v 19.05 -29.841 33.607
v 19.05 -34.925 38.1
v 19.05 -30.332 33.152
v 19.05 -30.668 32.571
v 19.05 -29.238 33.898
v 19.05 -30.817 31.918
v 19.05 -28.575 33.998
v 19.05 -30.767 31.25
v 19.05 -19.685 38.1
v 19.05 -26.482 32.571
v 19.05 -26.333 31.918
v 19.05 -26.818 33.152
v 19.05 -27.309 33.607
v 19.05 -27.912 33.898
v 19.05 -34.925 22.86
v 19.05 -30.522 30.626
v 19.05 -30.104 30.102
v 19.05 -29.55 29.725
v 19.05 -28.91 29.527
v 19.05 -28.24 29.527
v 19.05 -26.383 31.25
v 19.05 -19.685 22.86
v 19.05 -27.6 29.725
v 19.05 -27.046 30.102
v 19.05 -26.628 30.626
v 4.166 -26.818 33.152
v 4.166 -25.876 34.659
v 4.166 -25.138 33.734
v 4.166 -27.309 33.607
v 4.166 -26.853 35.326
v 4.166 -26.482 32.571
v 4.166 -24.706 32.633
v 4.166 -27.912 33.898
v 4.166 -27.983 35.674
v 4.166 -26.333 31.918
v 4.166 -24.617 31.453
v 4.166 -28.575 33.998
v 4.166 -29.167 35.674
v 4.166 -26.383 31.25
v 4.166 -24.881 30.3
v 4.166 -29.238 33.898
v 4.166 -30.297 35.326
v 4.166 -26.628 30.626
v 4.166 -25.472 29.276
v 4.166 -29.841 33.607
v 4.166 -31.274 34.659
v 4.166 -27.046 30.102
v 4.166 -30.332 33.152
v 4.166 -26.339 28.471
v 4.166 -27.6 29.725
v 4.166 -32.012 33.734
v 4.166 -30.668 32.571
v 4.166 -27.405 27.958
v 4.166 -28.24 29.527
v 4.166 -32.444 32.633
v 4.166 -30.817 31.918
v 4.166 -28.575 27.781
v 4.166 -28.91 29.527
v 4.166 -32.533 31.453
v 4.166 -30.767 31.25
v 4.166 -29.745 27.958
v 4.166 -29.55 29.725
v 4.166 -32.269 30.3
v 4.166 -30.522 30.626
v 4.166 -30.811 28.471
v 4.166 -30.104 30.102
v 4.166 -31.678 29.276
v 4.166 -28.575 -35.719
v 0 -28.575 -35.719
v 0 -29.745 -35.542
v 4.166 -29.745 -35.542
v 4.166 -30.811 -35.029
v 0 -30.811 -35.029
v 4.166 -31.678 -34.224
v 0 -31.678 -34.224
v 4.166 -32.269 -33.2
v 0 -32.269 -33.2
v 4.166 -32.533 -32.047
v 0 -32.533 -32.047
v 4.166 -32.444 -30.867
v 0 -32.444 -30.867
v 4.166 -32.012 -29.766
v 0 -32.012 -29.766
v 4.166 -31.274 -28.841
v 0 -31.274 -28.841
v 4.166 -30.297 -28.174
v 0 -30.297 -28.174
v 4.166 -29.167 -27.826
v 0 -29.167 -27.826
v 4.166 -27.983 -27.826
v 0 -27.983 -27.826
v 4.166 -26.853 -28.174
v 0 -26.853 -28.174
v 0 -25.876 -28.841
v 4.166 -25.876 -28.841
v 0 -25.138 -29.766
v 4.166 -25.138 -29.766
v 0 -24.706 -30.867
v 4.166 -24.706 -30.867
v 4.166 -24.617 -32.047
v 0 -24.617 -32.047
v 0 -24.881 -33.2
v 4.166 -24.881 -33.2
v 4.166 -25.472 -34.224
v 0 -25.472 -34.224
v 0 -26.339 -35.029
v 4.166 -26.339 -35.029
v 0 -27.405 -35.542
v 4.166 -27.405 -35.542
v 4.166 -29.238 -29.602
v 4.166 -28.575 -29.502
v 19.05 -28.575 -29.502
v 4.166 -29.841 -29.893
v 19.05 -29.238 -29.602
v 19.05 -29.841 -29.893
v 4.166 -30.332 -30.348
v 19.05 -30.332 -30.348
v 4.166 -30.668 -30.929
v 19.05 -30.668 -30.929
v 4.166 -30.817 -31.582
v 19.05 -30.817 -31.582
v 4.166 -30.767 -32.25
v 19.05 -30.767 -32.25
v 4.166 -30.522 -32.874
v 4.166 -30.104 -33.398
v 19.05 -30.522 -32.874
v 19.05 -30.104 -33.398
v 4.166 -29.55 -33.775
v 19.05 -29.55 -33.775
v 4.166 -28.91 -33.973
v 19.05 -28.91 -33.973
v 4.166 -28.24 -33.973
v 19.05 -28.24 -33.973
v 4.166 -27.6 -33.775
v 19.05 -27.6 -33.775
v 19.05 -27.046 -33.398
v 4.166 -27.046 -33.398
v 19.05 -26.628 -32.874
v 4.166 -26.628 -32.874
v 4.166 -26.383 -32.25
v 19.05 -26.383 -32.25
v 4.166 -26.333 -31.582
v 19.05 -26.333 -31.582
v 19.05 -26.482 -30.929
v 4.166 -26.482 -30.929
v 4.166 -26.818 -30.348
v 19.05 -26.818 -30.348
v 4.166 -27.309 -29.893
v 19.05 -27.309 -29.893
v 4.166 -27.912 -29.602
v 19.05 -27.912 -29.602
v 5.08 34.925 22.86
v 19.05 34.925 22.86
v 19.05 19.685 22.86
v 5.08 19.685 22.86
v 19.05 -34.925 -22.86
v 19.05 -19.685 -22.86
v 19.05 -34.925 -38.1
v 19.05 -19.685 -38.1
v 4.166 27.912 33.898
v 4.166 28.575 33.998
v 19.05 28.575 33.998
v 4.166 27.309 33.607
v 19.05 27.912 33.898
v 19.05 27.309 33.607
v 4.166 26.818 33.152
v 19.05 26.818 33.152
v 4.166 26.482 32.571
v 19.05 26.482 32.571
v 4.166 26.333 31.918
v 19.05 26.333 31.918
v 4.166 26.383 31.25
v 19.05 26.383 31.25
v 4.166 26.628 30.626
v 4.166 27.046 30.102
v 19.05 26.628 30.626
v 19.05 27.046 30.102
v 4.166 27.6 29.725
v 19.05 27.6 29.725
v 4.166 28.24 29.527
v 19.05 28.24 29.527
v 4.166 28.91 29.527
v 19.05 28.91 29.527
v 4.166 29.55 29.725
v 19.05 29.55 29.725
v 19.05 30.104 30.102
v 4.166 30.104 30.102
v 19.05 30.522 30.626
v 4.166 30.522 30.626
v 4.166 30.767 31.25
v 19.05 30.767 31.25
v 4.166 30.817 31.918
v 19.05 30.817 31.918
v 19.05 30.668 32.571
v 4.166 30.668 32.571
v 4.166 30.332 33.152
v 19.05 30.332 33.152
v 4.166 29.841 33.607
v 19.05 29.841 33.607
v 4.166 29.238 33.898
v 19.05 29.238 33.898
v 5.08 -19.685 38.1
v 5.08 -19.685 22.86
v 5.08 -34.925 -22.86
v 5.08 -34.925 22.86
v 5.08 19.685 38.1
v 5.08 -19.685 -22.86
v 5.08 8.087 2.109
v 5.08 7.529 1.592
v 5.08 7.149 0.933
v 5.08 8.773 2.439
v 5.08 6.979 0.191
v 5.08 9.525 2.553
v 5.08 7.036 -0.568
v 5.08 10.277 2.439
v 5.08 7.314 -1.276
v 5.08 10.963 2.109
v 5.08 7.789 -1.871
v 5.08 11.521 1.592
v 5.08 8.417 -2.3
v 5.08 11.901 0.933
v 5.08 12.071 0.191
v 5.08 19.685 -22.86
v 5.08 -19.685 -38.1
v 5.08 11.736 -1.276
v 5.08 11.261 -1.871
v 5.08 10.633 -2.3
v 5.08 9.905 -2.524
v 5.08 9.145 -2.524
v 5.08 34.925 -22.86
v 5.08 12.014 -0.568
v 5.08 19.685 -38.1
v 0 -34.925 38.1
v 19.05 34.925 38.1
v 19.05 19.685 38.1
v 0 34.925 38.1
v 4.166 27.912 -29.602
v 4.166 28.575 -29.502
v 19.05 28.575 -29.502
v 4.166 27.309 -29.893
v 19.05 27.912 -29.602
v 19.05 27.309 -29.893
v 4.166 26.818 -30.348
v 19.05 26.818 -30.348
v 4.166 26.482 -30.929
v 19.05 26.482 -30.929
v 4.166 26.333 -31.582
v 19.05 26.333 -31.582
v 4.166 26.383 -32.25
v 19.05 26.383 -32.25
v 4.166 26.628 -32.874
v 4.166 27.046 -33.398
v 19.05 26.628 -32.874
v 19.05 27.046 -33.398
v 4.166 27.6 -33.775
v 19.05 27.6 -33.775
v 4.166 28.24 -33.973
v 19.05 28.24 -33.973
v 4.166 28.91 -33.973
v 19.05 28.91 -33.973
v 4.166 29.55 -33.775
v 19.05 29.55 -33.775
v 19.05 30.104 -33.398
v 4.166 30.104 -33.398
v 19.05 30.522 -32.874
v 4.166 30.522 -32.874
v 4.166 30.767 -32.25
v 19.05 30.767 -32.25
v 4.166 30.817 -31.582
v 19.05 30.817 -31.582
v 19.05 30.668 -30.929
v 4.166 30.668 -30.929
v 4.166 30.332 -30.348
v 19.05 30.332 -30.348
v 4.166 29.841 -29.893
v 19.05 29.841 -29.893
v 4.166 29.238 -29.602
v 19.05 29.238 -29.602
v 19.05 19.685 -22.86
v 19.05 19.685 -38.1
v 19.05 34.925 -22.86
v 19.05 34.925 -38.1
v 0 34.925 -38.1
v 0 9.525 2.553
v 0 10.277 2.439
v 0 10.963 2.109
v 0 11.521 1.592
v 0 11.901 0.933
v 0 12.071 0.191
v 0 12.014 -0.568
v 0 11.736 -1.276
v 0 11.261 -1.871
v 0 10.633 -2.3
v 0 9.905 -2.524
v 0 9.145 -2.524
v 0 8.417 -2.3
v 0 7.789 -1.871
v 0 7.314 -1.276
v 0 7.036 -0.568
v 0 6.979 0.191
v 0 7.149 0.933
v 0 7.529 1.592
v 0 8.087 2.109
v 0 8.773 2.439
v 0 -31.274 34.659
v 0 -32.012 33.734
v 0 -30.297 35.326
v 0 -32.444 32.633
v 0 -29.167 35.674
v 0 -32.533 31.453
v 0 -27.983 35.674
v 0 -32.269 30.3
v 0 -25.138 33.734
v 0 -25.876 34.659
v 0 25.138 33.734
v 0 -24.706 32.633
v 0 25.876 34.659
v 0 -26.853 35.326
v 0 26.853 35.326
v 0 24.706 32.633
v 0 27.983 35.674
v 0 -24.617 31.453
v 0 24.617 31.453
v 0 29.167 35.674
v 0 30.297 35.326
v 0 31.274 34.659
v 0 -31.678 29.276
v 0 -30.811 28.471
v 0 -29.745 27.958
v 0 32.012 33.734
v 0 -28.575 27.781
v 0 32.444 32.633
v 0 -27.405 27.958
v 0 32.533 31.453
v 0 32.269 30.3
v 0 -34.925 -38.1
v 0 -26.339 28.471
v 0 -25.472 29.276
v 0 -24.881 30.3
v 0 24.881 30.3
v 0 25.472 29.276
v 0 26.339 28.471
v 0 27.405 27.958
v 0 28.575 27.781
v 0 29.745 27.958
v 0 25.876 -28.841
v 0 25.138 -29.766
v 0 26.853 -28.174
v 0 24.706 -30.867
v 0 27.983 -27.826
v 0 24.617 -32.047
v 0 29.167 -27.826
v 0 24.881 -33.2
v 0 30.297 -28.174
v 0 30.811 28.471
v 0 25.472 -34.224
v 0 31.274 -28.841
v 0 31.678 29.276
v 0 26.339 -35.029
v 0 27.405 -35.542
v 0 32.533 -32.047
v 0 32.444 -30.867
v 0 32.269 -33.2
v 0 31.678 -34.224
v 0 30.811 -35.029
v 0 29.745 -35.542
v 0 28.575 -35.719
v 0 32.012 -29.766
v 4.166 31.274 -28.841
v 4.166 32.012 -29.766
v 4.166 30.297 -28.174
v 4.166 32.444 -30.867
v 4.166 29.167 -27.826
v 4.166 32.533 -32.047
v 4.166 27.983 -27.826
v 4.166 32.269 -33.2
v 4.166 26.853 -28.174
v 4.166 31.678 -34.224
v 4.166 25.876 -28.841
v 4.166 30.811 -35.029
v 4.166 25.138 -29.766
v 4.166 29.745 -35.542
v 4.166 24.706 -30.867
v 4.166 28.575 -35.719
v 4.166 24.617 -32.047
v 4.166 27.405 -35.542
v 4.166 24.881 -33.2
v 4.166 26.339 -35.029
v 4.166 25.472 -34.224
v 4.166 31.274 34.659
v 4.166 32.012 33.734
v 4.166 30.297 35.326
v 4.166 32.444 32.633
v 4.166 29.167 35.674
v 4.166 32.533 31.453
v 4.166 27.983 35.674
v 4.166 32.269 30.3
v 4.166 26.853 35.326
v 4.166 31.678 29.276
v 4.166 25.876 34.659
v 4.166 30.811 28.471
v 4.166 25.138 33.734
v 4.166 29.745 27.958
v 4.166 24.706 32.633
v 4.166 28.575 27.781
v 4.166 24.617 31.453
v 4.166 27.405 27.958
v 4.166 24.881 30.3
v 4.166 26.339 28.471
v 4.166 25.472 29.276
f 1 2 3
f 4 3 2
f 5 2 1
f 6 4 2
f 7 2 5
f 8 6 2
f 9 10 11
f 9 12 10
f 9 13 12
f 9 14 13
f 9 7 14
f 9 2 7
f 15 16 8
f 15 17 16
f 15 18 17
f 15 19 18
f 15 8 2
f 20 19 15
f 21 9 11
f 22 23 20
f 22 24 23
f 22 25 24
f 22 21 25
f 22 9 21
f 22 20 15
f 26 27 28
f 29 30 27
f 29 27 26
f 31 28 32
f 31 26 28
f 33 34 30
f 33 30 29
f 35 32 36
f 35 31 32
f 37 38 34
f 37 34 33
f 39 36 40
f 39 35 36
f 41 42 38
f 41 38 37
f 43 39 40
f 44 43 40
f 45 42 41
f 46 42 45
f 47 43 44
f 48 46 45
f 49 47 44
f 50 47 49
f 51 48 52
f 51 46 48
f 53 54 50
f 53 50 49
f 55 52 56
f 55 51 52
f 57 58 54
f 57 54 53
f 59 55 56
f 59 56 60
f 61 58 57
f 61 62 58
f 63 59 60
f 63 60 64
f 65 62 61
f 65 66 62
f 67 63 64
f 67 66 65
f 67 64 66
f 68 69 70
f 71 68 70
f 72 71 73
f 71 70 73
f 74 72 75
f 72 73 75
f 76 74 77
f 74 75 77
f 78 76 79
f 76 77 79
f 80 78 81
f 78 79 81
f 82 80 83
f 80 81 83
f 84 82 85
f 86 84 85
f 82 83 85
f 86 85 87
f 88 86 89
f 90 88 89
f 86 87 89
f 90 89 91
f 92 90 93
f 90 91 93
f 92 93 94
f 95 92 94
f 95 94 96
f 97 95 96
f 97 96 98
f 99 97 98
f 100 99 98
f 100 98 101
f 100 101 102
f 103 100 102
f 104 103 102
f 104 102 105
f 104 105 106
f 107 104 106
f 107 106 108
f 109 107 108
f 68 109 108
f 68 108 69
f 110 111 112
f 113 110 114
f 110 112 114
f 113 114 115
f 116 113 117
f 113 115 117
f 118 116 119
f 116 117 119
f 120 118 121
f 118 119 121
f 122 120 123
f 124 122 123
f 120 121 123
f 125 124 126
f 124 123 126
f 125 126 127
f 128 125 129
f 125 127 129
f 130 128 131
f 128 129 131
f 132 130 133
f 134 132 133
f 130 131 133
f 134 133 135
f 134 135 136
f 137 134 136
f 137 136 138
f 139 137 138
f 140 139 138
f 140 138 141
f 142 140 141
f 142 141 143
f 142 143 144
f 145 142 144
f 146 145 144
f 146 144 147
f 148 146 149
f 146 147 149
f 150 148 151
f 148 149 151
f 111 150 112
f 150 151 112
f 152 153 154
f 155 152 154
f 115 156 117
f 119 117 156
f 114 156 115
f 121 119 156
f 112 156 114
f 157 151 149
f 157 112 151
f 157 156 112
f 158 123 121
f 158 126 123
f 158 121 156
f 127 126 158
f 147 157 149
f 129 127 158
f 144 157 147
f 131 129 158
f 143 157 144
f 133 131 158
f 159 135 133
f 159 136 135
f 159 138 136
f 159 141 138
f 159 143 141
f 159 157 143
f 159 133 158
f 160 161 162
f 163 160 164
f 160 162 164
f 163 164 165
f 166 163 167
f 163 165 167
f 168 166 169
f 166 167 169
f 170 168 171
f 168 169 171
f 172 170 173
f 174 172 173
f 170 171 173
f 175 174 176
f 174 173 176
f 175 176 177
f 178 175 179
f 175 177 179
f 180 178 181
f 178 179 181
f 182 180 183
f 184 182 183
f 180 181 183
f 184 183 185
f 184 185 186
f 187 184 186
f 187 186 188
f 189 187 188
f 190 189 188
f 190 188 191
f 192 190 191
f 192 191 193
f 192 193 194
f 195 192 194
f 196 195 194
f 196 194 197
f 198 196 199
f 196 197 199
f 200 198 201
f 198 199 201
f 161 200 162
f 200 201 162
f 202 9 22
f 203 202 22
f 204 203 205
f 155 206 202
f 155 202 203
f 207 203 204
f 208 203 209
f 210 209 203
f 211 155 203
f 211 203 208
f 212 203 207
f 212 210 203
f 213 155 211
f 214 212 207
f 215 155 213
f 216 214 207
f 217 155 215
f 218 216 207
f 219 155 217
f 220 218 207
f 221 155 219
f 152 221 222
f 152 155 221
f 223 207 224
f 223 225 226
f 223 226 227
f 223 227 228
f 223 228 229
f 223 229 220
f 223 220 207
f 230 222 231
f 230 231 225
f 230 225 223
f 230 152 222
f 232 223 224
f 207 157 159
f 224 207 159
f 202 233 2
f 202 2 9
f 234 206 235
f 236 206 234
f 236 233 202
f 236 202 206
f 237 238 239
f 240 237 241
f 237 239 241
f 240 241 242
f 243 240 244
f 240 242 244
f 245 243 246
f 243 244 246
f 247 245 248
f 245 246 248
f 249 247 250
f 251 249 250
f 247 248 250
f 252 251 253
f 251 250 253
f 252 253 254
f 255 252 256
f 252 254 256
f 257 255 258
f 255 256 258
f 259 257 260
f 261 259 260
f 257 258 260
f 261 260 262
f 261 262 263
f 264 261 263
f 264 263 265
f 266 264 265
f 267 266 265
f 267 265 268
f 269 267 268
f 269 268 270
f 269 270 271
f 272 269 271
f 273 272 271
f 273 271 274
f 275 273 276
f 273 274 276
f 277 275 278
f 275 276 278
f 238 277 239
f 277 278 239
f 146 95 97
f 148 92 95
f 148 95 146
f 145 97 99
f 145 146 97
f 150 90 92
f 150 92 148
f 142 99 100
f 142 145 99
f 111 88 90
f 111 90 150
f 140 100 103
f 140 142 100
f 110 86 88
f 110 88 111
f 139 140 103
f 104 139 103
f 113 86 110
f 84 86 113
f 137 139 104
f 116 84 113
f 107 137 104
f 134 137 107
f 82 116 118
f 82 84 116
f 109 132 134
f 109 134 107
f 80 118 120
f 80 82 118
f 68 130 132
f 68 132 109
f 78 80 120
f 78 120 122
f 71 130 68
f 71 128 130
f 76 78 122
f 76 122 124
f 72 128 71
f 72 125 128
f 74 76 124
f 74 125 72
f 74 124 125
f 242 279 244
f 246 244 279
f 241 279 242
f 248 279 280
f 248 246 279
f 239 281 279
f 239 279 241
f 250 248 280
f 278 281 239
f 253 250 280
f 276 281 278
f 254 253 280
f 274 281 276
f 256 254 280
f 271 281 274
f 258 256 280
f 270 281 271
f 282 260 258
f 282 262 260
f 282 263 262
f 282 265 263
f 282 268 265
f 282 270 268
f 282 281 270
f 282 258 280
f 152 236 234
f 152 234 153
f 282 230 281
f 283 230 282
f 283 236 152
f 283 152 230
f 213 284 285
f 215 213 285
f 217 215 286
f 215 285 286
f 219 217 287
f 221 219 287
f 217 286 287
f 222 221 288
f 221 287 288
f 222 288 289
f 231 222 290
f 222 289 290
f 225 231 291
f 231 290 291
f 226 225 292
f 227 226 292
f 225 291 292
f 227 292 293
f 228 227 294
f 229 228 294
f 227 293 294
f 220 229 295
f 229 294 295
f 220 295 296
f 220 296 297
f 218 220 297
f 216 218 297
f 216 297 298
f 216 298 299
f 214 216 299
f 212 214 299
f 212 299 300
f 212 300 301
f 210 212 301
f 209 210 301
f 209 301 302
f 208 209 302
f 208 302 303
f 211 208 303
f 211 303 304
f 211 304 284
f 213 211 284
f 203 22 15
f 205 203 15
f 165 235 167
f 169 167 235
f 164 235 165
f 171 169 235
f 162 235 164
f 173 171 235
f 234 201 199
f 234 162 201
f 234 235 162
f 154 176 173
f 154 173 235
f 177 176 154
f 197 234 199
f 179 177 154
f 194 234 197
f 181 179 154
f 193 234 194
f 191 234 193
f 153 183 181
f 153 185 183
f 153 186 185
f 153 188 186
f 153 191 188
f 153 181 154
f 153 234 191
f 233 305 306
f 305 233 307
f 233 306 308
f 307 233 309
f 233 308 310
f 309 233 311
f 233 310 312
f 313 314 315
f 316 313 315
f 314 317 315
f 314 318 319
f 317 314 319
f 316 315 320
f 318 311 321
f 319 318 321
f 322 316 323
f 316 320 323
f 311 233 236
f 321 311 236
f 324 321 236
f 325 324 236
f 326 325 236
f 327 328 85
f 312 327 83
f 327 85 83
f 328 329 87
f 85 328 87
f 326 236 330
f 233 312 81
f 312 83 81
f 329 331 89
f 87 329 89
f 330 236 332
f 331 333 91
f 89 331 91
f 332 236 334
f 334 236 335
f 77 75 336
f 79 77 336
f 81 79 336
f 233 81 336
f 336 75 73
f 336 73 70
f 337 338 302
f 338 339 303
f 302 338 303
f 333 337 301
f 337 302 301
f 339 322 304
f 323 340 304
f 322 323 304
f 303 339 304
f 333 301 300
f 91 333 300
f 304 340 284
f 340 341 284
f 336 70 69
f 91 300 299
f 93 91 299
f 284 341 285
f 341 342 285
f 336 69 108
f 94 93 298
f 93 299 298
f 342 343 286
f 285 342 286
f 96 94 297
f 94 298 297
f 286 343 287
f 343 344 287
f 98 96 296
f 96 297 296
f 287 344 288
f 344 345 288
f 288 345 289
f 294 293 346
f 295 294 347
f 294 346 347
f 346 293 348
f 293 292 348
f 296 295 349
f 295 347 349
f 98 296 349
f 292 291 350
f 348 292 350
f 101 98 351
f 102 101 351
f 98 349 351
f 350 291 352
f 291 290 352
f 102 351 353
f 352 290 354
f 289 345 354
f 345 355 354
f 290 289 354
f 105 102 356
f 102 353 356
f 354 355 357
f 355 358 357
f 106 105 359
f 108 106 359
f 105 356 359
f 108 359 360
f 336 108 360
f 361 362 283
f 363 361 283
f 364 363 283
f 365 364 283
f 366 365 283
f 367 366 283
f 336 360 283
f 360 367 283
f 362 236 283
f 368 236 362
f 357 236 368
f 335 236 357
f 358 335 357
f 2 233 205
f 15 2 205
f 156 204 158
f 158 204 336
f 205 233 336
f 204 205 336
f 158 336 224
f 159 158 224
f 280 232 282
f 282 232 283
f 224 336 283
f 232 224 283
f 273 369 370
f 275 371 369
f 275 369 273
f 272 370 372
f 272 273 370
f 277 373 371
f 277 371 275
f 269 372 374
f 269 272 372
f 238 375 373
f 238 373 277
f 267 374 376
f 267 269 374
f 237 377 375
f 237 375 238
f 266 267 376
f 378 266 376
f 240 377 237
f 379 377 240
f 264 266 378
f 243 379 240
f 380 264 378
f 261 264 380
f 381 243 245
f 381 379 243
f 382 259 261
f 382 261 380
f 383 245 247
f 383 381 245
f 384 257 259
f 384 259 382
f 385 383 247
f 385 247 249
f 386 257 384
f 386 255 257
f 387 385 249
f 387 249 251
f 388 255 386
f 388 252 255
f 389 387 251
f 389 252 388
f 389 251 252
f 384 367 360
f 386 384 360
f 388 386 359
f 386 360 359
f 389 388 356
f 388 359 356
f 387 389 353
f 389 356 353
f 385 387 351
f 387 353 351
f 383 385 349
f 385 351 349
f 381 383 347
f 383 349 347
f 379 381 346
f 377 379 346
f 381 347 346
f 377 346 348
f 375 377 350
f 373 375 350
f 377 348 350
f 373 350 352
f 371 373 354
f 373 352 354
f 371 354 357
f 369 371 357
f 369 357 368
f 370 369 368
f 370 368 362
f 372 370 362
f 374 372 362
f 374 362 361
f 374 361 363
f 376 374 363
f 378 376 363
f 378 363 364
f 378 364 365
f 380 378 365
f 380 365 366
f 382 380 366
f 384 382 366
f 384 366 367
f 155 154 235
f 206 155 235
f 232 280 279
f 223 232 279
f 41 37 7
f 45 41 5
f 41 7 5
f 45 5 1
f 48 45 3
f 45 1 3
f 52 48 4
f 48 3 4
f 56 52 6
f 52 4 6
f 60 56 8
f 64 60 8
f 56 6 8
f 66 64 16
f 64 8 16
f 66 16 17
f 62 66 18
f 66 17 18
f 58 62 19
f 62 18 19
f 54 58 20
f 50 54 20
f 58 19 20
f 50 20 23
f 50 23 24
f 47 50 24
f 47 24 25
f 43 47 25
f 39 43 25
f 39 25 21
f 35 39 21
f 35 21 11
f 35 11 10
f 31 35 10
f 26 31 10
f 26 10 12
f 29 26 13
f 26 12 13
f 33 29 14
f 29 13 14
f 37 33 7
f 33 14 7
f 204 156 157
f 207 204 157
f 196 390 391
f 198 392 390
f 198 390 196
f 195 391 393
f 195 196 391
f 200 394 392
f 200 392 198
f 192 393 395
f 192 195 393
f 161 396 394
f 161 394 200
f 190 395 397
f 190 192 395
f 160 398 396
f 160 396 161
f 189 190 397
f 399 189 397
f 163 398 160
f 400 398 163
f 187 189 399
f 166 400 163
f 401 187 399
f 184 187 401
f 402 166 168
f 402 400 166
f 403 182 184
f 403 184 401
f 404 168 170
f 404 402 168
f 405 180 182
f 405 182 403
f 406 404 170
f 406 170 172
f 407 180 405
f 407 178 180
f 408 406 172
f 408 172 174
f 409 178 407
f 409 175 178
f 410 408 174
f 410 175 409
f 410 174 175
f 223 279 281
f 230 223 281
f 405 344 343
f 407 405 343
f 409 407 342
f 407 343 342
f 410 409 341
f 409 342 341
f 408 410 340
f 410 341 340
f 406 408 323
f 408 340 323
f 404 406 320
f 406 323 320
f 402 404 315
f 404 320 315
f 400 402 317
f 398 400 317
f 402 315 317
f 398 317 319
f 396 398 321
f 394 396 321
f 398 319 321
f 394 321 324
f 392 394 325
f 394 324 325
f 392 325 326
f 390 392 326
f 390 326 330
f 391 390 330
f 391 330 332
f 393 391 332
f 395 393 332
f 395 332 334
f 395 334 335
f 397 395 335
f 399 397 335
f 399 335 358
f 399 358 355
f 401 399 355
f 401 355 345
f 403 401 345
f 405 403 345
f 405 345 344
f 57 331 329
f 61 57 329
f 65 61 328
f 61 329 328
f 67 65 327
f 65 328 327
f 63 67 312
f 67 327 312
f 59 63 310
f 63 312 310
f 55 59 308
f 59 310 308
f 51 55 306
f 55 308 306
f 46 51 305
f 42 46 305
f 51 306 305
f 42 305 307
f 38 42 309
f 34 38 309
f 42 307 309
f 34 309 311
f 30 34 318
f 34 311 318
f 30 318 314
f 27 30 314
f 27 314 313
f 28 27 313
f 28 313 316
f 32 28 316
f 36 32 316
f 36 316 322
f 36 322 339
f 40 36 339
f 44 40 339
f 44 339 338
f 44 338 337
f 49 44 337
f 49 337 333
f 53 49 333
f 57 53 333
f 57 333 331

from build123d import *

# Parameters (mm, degrees)
SKETCH1_W                                      = 76.2
SKETCH1_H                                      = 69.85
BOSS_EXTRUDE1_DEPTH                            = 19.05
CUT_EXTRUDE1_DEPTH                             = 13.97
CBORE_FOR_8_SOCKET_HEAD_CAP_SCREW1_D           = 4.4958
CBORE_FOR_8_SOCKET_HEAD_CAP_SCREW1_CBORE_D     = 7.9375
CBORE_FOR_8_SOCKET_HEAD_CAP_SCREW1_CBORE_DEPTH = 4.1656
F_1_4_20_TAPPED_HOLE1_D                        = 5.1054
F_1_4_20_TAPPED_HOLE1_DEPTH                    = 19.05
F_1_4_20_TAPPED_HOLE1_TIP                      = 1.533816902


with BuildPart() as part:
    # Sketch1 → Boss-Extrude1 (new body)
    with BuildSketch(Plane(origin=(0, 0, 0), x_dir=(0, 0, -1), z_dir=(1, 0, 0))):
        Rectangle(SKETCH1_W, SKETCH1_H)
    extrude(amount=BOSS_EXTRUDE1_DEPTH)

    # Sketch2 → Cut-Extrude1 (cut)
    with BuildSketch(Plane(origin=(19.05, 0, 0), x_dir=(0, 0, -1), z_dir=(1, 0, 0))):
        Polygon((-22.86, -34.925), (22.86, -34.925), (22.86, -19.685), (38.1, -19.685), (38.1, 19.685), (22.86, 19.685), (22.86, 34.925), (-22.86, 34.925), (-22.86, 19.685), (-38.1, 19.685), (-38.1, -19.685), (-22.86, -19.685), align=None)
    extrude(amount=-CUT_EXTRUDE1_DEPTH, mode=Mode.SUBTRACT)

    # CBORE for #8 Socket Head Cap Screw1 (through all)
    with Locations(Plane(origin=(0, -5.74842533, -9.122205943), x_dir=(0, 0, -1), z_dir=(-1, 0, 0))):
        with Locations((-40.872205943, -34.32342533), (22.627794057, -34.32342533), (22.627794057, 22.82657467), (-40.872205943, 22.82657467)):
            CounterBoreHole(CBORE_FOR_8_SOCKET_HEAD_CAP_SCREW1_D / 2, CBORE_FOR_8_SOCKET_HEAD_CAP_SCREW1_CBORE_D / 2, CBORE_FOR_8_SOCKET_HEAD_CAP_SCREW1_CBORE_DEPTH)

    # 1/4-20 Tapped Hole1
    with Locations(Plane(origin=(5.08, 0, 0), x_dir=(0, 0, -1), z_dir=(1, 0, 0))):
        with Locations((0, 9.525)):
            Hole(F_1_4_20_TAPPED_HOLE1_D / 2, depth=F_1_4_20_TAPPED_HOLE1_DEPTH)
            with Locations((0, 0, -(F_1_4_20_TAPPED_HOLE1_DEPTH + F_1_4_20_TAPPED_HOLE1_TIP / 2))):  # 118° drill point
                Cone(0, F_1_4_20_TAPPED_HOLE1_D / 2, F_1_4_20_TAPPED_HOLE1_TIP, mode=Mode.SUBTRACT)


solid = part.part
